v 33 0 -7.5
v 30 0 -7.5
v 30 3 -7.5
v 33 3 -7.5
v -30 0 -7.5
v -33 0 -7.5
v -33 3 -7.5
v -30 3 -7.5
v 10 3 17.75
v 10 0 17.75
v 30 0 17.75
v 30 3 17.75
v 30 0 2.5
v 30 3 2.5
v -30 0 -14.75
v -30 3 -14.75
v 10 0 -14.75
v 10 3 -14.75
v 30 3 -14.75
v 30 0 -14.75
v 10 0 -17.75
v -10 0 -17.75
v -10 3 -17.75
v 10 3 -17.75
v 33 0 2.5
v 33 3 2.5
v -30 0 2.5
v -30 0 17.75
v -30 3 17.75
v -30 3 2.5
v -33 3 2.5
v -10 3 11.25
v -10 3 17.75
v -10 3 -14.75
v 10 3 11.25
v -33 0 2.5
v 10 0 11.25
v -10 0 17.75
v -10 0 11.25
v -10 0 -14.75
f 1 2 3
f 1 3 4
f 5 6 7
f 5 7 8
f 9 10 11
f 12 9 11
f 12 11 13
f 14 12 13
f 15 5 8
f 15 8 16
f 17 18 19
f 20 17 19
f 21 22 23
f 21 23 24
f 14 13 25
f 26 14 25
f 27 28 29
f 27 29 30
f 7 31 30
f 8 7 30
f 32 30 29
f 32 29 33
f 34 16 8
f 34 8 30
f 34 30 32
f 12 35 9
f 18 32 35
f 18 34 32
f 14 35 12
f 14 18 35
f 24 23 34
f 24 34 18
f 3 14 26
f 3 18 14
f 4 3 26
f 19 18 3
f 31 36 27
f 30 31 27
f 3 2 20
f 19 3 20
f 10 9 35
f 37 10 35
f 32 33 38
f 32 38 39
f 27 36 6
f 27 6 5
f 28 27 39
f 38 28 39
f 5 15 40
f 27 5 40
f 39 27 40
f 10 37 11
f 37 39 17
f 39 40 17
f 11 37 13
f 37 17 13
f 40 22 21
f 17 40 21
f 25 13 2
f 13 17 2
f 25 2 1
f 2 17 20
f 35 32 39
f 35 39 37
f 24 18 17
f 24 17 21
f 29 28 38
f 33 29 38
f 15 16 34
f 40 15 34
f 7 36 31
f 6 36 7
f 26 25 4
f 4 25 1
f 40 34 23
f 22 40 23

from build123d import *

# Parameters (mm, degrees)
SKETCH2_W           = 60
SKETCH2_H           = 35.5
BOSS_EXTRUDE1_DEPTH = 3
SKETCH3_W           = 3
SKETCH3_H           = 10
BOSS_EXTRUDE2_DEPTH = 3
SKETCH4_W           = 20
SKETCH4_H           = 3
CUT_EXTRUDE2_DEPTH  = 3
SKETCH5_W           = 20
SKETCH5_H           = 6.5
CUT_EXTRUDE3_DEPTH  = 10


with BuildPart() as part:
    # Sketch2 → Boss-Extrude1 (new body)
    with BuildSketch(Plane(origin=(0, 0, 0), x_dir=(1, 0, 0), z_dir=(0, 1, 0))):
        Rectangle(SKETCH2_W, SKETCH2_H)
    extrude(amount=BOSS_EXTRUDE1_DEPTH)

    # Sketch3 → Boss-Extrude2 (add)
    with BuildSketch(Plane(origin=(0, 0, 0), x_dir=(1, 0, 0), z_dir=(0, 1, 0))):
        with Locations((-31.5, 2.5)):
            Rectangle(SKETCH3_W, SKETCH3_H)
        with Locations((31.5, 2.5)):
            Rectangle(SKETCH3_W, SKETCH3_H)
    extrude(amount=BOSS_EXTRUDE2_DEPTH)

    # Sketch4 → Cut-Extrude2 (cut)
    with BuildSketch(Plane(origin=(0, 3, 0), x_dir=(1, 0, 0), z_dir=(0, 1, 0))):
        with Locations((-20, 16.25)):
            Rectangle(SKETCH4_W, SKETCH4_H)
        with Locations((20, 16.25)):
            Rectangle(SKETCH4_W, SKETCH4_H)
    extrude(amount=-CUT_EXTRUDE2_DEPTH, mode=Mode.SUBTRACT)

    # Sketch5 → Cut-Extrude3 (cut)
    with BuildSketch(Plane(origin=(0, 3, 0), x_dir=(1, 0, 0), z_dir=(0, 1, 0))):
        with Locations((0, -14.5)):
            Rectangle(SKETCH5_W, SKETCH5_H)
    extrude(amount=-CUT_EXTRUDE3_DEPTH, mode=Mode.SUBTRACT)


solid = part.part
